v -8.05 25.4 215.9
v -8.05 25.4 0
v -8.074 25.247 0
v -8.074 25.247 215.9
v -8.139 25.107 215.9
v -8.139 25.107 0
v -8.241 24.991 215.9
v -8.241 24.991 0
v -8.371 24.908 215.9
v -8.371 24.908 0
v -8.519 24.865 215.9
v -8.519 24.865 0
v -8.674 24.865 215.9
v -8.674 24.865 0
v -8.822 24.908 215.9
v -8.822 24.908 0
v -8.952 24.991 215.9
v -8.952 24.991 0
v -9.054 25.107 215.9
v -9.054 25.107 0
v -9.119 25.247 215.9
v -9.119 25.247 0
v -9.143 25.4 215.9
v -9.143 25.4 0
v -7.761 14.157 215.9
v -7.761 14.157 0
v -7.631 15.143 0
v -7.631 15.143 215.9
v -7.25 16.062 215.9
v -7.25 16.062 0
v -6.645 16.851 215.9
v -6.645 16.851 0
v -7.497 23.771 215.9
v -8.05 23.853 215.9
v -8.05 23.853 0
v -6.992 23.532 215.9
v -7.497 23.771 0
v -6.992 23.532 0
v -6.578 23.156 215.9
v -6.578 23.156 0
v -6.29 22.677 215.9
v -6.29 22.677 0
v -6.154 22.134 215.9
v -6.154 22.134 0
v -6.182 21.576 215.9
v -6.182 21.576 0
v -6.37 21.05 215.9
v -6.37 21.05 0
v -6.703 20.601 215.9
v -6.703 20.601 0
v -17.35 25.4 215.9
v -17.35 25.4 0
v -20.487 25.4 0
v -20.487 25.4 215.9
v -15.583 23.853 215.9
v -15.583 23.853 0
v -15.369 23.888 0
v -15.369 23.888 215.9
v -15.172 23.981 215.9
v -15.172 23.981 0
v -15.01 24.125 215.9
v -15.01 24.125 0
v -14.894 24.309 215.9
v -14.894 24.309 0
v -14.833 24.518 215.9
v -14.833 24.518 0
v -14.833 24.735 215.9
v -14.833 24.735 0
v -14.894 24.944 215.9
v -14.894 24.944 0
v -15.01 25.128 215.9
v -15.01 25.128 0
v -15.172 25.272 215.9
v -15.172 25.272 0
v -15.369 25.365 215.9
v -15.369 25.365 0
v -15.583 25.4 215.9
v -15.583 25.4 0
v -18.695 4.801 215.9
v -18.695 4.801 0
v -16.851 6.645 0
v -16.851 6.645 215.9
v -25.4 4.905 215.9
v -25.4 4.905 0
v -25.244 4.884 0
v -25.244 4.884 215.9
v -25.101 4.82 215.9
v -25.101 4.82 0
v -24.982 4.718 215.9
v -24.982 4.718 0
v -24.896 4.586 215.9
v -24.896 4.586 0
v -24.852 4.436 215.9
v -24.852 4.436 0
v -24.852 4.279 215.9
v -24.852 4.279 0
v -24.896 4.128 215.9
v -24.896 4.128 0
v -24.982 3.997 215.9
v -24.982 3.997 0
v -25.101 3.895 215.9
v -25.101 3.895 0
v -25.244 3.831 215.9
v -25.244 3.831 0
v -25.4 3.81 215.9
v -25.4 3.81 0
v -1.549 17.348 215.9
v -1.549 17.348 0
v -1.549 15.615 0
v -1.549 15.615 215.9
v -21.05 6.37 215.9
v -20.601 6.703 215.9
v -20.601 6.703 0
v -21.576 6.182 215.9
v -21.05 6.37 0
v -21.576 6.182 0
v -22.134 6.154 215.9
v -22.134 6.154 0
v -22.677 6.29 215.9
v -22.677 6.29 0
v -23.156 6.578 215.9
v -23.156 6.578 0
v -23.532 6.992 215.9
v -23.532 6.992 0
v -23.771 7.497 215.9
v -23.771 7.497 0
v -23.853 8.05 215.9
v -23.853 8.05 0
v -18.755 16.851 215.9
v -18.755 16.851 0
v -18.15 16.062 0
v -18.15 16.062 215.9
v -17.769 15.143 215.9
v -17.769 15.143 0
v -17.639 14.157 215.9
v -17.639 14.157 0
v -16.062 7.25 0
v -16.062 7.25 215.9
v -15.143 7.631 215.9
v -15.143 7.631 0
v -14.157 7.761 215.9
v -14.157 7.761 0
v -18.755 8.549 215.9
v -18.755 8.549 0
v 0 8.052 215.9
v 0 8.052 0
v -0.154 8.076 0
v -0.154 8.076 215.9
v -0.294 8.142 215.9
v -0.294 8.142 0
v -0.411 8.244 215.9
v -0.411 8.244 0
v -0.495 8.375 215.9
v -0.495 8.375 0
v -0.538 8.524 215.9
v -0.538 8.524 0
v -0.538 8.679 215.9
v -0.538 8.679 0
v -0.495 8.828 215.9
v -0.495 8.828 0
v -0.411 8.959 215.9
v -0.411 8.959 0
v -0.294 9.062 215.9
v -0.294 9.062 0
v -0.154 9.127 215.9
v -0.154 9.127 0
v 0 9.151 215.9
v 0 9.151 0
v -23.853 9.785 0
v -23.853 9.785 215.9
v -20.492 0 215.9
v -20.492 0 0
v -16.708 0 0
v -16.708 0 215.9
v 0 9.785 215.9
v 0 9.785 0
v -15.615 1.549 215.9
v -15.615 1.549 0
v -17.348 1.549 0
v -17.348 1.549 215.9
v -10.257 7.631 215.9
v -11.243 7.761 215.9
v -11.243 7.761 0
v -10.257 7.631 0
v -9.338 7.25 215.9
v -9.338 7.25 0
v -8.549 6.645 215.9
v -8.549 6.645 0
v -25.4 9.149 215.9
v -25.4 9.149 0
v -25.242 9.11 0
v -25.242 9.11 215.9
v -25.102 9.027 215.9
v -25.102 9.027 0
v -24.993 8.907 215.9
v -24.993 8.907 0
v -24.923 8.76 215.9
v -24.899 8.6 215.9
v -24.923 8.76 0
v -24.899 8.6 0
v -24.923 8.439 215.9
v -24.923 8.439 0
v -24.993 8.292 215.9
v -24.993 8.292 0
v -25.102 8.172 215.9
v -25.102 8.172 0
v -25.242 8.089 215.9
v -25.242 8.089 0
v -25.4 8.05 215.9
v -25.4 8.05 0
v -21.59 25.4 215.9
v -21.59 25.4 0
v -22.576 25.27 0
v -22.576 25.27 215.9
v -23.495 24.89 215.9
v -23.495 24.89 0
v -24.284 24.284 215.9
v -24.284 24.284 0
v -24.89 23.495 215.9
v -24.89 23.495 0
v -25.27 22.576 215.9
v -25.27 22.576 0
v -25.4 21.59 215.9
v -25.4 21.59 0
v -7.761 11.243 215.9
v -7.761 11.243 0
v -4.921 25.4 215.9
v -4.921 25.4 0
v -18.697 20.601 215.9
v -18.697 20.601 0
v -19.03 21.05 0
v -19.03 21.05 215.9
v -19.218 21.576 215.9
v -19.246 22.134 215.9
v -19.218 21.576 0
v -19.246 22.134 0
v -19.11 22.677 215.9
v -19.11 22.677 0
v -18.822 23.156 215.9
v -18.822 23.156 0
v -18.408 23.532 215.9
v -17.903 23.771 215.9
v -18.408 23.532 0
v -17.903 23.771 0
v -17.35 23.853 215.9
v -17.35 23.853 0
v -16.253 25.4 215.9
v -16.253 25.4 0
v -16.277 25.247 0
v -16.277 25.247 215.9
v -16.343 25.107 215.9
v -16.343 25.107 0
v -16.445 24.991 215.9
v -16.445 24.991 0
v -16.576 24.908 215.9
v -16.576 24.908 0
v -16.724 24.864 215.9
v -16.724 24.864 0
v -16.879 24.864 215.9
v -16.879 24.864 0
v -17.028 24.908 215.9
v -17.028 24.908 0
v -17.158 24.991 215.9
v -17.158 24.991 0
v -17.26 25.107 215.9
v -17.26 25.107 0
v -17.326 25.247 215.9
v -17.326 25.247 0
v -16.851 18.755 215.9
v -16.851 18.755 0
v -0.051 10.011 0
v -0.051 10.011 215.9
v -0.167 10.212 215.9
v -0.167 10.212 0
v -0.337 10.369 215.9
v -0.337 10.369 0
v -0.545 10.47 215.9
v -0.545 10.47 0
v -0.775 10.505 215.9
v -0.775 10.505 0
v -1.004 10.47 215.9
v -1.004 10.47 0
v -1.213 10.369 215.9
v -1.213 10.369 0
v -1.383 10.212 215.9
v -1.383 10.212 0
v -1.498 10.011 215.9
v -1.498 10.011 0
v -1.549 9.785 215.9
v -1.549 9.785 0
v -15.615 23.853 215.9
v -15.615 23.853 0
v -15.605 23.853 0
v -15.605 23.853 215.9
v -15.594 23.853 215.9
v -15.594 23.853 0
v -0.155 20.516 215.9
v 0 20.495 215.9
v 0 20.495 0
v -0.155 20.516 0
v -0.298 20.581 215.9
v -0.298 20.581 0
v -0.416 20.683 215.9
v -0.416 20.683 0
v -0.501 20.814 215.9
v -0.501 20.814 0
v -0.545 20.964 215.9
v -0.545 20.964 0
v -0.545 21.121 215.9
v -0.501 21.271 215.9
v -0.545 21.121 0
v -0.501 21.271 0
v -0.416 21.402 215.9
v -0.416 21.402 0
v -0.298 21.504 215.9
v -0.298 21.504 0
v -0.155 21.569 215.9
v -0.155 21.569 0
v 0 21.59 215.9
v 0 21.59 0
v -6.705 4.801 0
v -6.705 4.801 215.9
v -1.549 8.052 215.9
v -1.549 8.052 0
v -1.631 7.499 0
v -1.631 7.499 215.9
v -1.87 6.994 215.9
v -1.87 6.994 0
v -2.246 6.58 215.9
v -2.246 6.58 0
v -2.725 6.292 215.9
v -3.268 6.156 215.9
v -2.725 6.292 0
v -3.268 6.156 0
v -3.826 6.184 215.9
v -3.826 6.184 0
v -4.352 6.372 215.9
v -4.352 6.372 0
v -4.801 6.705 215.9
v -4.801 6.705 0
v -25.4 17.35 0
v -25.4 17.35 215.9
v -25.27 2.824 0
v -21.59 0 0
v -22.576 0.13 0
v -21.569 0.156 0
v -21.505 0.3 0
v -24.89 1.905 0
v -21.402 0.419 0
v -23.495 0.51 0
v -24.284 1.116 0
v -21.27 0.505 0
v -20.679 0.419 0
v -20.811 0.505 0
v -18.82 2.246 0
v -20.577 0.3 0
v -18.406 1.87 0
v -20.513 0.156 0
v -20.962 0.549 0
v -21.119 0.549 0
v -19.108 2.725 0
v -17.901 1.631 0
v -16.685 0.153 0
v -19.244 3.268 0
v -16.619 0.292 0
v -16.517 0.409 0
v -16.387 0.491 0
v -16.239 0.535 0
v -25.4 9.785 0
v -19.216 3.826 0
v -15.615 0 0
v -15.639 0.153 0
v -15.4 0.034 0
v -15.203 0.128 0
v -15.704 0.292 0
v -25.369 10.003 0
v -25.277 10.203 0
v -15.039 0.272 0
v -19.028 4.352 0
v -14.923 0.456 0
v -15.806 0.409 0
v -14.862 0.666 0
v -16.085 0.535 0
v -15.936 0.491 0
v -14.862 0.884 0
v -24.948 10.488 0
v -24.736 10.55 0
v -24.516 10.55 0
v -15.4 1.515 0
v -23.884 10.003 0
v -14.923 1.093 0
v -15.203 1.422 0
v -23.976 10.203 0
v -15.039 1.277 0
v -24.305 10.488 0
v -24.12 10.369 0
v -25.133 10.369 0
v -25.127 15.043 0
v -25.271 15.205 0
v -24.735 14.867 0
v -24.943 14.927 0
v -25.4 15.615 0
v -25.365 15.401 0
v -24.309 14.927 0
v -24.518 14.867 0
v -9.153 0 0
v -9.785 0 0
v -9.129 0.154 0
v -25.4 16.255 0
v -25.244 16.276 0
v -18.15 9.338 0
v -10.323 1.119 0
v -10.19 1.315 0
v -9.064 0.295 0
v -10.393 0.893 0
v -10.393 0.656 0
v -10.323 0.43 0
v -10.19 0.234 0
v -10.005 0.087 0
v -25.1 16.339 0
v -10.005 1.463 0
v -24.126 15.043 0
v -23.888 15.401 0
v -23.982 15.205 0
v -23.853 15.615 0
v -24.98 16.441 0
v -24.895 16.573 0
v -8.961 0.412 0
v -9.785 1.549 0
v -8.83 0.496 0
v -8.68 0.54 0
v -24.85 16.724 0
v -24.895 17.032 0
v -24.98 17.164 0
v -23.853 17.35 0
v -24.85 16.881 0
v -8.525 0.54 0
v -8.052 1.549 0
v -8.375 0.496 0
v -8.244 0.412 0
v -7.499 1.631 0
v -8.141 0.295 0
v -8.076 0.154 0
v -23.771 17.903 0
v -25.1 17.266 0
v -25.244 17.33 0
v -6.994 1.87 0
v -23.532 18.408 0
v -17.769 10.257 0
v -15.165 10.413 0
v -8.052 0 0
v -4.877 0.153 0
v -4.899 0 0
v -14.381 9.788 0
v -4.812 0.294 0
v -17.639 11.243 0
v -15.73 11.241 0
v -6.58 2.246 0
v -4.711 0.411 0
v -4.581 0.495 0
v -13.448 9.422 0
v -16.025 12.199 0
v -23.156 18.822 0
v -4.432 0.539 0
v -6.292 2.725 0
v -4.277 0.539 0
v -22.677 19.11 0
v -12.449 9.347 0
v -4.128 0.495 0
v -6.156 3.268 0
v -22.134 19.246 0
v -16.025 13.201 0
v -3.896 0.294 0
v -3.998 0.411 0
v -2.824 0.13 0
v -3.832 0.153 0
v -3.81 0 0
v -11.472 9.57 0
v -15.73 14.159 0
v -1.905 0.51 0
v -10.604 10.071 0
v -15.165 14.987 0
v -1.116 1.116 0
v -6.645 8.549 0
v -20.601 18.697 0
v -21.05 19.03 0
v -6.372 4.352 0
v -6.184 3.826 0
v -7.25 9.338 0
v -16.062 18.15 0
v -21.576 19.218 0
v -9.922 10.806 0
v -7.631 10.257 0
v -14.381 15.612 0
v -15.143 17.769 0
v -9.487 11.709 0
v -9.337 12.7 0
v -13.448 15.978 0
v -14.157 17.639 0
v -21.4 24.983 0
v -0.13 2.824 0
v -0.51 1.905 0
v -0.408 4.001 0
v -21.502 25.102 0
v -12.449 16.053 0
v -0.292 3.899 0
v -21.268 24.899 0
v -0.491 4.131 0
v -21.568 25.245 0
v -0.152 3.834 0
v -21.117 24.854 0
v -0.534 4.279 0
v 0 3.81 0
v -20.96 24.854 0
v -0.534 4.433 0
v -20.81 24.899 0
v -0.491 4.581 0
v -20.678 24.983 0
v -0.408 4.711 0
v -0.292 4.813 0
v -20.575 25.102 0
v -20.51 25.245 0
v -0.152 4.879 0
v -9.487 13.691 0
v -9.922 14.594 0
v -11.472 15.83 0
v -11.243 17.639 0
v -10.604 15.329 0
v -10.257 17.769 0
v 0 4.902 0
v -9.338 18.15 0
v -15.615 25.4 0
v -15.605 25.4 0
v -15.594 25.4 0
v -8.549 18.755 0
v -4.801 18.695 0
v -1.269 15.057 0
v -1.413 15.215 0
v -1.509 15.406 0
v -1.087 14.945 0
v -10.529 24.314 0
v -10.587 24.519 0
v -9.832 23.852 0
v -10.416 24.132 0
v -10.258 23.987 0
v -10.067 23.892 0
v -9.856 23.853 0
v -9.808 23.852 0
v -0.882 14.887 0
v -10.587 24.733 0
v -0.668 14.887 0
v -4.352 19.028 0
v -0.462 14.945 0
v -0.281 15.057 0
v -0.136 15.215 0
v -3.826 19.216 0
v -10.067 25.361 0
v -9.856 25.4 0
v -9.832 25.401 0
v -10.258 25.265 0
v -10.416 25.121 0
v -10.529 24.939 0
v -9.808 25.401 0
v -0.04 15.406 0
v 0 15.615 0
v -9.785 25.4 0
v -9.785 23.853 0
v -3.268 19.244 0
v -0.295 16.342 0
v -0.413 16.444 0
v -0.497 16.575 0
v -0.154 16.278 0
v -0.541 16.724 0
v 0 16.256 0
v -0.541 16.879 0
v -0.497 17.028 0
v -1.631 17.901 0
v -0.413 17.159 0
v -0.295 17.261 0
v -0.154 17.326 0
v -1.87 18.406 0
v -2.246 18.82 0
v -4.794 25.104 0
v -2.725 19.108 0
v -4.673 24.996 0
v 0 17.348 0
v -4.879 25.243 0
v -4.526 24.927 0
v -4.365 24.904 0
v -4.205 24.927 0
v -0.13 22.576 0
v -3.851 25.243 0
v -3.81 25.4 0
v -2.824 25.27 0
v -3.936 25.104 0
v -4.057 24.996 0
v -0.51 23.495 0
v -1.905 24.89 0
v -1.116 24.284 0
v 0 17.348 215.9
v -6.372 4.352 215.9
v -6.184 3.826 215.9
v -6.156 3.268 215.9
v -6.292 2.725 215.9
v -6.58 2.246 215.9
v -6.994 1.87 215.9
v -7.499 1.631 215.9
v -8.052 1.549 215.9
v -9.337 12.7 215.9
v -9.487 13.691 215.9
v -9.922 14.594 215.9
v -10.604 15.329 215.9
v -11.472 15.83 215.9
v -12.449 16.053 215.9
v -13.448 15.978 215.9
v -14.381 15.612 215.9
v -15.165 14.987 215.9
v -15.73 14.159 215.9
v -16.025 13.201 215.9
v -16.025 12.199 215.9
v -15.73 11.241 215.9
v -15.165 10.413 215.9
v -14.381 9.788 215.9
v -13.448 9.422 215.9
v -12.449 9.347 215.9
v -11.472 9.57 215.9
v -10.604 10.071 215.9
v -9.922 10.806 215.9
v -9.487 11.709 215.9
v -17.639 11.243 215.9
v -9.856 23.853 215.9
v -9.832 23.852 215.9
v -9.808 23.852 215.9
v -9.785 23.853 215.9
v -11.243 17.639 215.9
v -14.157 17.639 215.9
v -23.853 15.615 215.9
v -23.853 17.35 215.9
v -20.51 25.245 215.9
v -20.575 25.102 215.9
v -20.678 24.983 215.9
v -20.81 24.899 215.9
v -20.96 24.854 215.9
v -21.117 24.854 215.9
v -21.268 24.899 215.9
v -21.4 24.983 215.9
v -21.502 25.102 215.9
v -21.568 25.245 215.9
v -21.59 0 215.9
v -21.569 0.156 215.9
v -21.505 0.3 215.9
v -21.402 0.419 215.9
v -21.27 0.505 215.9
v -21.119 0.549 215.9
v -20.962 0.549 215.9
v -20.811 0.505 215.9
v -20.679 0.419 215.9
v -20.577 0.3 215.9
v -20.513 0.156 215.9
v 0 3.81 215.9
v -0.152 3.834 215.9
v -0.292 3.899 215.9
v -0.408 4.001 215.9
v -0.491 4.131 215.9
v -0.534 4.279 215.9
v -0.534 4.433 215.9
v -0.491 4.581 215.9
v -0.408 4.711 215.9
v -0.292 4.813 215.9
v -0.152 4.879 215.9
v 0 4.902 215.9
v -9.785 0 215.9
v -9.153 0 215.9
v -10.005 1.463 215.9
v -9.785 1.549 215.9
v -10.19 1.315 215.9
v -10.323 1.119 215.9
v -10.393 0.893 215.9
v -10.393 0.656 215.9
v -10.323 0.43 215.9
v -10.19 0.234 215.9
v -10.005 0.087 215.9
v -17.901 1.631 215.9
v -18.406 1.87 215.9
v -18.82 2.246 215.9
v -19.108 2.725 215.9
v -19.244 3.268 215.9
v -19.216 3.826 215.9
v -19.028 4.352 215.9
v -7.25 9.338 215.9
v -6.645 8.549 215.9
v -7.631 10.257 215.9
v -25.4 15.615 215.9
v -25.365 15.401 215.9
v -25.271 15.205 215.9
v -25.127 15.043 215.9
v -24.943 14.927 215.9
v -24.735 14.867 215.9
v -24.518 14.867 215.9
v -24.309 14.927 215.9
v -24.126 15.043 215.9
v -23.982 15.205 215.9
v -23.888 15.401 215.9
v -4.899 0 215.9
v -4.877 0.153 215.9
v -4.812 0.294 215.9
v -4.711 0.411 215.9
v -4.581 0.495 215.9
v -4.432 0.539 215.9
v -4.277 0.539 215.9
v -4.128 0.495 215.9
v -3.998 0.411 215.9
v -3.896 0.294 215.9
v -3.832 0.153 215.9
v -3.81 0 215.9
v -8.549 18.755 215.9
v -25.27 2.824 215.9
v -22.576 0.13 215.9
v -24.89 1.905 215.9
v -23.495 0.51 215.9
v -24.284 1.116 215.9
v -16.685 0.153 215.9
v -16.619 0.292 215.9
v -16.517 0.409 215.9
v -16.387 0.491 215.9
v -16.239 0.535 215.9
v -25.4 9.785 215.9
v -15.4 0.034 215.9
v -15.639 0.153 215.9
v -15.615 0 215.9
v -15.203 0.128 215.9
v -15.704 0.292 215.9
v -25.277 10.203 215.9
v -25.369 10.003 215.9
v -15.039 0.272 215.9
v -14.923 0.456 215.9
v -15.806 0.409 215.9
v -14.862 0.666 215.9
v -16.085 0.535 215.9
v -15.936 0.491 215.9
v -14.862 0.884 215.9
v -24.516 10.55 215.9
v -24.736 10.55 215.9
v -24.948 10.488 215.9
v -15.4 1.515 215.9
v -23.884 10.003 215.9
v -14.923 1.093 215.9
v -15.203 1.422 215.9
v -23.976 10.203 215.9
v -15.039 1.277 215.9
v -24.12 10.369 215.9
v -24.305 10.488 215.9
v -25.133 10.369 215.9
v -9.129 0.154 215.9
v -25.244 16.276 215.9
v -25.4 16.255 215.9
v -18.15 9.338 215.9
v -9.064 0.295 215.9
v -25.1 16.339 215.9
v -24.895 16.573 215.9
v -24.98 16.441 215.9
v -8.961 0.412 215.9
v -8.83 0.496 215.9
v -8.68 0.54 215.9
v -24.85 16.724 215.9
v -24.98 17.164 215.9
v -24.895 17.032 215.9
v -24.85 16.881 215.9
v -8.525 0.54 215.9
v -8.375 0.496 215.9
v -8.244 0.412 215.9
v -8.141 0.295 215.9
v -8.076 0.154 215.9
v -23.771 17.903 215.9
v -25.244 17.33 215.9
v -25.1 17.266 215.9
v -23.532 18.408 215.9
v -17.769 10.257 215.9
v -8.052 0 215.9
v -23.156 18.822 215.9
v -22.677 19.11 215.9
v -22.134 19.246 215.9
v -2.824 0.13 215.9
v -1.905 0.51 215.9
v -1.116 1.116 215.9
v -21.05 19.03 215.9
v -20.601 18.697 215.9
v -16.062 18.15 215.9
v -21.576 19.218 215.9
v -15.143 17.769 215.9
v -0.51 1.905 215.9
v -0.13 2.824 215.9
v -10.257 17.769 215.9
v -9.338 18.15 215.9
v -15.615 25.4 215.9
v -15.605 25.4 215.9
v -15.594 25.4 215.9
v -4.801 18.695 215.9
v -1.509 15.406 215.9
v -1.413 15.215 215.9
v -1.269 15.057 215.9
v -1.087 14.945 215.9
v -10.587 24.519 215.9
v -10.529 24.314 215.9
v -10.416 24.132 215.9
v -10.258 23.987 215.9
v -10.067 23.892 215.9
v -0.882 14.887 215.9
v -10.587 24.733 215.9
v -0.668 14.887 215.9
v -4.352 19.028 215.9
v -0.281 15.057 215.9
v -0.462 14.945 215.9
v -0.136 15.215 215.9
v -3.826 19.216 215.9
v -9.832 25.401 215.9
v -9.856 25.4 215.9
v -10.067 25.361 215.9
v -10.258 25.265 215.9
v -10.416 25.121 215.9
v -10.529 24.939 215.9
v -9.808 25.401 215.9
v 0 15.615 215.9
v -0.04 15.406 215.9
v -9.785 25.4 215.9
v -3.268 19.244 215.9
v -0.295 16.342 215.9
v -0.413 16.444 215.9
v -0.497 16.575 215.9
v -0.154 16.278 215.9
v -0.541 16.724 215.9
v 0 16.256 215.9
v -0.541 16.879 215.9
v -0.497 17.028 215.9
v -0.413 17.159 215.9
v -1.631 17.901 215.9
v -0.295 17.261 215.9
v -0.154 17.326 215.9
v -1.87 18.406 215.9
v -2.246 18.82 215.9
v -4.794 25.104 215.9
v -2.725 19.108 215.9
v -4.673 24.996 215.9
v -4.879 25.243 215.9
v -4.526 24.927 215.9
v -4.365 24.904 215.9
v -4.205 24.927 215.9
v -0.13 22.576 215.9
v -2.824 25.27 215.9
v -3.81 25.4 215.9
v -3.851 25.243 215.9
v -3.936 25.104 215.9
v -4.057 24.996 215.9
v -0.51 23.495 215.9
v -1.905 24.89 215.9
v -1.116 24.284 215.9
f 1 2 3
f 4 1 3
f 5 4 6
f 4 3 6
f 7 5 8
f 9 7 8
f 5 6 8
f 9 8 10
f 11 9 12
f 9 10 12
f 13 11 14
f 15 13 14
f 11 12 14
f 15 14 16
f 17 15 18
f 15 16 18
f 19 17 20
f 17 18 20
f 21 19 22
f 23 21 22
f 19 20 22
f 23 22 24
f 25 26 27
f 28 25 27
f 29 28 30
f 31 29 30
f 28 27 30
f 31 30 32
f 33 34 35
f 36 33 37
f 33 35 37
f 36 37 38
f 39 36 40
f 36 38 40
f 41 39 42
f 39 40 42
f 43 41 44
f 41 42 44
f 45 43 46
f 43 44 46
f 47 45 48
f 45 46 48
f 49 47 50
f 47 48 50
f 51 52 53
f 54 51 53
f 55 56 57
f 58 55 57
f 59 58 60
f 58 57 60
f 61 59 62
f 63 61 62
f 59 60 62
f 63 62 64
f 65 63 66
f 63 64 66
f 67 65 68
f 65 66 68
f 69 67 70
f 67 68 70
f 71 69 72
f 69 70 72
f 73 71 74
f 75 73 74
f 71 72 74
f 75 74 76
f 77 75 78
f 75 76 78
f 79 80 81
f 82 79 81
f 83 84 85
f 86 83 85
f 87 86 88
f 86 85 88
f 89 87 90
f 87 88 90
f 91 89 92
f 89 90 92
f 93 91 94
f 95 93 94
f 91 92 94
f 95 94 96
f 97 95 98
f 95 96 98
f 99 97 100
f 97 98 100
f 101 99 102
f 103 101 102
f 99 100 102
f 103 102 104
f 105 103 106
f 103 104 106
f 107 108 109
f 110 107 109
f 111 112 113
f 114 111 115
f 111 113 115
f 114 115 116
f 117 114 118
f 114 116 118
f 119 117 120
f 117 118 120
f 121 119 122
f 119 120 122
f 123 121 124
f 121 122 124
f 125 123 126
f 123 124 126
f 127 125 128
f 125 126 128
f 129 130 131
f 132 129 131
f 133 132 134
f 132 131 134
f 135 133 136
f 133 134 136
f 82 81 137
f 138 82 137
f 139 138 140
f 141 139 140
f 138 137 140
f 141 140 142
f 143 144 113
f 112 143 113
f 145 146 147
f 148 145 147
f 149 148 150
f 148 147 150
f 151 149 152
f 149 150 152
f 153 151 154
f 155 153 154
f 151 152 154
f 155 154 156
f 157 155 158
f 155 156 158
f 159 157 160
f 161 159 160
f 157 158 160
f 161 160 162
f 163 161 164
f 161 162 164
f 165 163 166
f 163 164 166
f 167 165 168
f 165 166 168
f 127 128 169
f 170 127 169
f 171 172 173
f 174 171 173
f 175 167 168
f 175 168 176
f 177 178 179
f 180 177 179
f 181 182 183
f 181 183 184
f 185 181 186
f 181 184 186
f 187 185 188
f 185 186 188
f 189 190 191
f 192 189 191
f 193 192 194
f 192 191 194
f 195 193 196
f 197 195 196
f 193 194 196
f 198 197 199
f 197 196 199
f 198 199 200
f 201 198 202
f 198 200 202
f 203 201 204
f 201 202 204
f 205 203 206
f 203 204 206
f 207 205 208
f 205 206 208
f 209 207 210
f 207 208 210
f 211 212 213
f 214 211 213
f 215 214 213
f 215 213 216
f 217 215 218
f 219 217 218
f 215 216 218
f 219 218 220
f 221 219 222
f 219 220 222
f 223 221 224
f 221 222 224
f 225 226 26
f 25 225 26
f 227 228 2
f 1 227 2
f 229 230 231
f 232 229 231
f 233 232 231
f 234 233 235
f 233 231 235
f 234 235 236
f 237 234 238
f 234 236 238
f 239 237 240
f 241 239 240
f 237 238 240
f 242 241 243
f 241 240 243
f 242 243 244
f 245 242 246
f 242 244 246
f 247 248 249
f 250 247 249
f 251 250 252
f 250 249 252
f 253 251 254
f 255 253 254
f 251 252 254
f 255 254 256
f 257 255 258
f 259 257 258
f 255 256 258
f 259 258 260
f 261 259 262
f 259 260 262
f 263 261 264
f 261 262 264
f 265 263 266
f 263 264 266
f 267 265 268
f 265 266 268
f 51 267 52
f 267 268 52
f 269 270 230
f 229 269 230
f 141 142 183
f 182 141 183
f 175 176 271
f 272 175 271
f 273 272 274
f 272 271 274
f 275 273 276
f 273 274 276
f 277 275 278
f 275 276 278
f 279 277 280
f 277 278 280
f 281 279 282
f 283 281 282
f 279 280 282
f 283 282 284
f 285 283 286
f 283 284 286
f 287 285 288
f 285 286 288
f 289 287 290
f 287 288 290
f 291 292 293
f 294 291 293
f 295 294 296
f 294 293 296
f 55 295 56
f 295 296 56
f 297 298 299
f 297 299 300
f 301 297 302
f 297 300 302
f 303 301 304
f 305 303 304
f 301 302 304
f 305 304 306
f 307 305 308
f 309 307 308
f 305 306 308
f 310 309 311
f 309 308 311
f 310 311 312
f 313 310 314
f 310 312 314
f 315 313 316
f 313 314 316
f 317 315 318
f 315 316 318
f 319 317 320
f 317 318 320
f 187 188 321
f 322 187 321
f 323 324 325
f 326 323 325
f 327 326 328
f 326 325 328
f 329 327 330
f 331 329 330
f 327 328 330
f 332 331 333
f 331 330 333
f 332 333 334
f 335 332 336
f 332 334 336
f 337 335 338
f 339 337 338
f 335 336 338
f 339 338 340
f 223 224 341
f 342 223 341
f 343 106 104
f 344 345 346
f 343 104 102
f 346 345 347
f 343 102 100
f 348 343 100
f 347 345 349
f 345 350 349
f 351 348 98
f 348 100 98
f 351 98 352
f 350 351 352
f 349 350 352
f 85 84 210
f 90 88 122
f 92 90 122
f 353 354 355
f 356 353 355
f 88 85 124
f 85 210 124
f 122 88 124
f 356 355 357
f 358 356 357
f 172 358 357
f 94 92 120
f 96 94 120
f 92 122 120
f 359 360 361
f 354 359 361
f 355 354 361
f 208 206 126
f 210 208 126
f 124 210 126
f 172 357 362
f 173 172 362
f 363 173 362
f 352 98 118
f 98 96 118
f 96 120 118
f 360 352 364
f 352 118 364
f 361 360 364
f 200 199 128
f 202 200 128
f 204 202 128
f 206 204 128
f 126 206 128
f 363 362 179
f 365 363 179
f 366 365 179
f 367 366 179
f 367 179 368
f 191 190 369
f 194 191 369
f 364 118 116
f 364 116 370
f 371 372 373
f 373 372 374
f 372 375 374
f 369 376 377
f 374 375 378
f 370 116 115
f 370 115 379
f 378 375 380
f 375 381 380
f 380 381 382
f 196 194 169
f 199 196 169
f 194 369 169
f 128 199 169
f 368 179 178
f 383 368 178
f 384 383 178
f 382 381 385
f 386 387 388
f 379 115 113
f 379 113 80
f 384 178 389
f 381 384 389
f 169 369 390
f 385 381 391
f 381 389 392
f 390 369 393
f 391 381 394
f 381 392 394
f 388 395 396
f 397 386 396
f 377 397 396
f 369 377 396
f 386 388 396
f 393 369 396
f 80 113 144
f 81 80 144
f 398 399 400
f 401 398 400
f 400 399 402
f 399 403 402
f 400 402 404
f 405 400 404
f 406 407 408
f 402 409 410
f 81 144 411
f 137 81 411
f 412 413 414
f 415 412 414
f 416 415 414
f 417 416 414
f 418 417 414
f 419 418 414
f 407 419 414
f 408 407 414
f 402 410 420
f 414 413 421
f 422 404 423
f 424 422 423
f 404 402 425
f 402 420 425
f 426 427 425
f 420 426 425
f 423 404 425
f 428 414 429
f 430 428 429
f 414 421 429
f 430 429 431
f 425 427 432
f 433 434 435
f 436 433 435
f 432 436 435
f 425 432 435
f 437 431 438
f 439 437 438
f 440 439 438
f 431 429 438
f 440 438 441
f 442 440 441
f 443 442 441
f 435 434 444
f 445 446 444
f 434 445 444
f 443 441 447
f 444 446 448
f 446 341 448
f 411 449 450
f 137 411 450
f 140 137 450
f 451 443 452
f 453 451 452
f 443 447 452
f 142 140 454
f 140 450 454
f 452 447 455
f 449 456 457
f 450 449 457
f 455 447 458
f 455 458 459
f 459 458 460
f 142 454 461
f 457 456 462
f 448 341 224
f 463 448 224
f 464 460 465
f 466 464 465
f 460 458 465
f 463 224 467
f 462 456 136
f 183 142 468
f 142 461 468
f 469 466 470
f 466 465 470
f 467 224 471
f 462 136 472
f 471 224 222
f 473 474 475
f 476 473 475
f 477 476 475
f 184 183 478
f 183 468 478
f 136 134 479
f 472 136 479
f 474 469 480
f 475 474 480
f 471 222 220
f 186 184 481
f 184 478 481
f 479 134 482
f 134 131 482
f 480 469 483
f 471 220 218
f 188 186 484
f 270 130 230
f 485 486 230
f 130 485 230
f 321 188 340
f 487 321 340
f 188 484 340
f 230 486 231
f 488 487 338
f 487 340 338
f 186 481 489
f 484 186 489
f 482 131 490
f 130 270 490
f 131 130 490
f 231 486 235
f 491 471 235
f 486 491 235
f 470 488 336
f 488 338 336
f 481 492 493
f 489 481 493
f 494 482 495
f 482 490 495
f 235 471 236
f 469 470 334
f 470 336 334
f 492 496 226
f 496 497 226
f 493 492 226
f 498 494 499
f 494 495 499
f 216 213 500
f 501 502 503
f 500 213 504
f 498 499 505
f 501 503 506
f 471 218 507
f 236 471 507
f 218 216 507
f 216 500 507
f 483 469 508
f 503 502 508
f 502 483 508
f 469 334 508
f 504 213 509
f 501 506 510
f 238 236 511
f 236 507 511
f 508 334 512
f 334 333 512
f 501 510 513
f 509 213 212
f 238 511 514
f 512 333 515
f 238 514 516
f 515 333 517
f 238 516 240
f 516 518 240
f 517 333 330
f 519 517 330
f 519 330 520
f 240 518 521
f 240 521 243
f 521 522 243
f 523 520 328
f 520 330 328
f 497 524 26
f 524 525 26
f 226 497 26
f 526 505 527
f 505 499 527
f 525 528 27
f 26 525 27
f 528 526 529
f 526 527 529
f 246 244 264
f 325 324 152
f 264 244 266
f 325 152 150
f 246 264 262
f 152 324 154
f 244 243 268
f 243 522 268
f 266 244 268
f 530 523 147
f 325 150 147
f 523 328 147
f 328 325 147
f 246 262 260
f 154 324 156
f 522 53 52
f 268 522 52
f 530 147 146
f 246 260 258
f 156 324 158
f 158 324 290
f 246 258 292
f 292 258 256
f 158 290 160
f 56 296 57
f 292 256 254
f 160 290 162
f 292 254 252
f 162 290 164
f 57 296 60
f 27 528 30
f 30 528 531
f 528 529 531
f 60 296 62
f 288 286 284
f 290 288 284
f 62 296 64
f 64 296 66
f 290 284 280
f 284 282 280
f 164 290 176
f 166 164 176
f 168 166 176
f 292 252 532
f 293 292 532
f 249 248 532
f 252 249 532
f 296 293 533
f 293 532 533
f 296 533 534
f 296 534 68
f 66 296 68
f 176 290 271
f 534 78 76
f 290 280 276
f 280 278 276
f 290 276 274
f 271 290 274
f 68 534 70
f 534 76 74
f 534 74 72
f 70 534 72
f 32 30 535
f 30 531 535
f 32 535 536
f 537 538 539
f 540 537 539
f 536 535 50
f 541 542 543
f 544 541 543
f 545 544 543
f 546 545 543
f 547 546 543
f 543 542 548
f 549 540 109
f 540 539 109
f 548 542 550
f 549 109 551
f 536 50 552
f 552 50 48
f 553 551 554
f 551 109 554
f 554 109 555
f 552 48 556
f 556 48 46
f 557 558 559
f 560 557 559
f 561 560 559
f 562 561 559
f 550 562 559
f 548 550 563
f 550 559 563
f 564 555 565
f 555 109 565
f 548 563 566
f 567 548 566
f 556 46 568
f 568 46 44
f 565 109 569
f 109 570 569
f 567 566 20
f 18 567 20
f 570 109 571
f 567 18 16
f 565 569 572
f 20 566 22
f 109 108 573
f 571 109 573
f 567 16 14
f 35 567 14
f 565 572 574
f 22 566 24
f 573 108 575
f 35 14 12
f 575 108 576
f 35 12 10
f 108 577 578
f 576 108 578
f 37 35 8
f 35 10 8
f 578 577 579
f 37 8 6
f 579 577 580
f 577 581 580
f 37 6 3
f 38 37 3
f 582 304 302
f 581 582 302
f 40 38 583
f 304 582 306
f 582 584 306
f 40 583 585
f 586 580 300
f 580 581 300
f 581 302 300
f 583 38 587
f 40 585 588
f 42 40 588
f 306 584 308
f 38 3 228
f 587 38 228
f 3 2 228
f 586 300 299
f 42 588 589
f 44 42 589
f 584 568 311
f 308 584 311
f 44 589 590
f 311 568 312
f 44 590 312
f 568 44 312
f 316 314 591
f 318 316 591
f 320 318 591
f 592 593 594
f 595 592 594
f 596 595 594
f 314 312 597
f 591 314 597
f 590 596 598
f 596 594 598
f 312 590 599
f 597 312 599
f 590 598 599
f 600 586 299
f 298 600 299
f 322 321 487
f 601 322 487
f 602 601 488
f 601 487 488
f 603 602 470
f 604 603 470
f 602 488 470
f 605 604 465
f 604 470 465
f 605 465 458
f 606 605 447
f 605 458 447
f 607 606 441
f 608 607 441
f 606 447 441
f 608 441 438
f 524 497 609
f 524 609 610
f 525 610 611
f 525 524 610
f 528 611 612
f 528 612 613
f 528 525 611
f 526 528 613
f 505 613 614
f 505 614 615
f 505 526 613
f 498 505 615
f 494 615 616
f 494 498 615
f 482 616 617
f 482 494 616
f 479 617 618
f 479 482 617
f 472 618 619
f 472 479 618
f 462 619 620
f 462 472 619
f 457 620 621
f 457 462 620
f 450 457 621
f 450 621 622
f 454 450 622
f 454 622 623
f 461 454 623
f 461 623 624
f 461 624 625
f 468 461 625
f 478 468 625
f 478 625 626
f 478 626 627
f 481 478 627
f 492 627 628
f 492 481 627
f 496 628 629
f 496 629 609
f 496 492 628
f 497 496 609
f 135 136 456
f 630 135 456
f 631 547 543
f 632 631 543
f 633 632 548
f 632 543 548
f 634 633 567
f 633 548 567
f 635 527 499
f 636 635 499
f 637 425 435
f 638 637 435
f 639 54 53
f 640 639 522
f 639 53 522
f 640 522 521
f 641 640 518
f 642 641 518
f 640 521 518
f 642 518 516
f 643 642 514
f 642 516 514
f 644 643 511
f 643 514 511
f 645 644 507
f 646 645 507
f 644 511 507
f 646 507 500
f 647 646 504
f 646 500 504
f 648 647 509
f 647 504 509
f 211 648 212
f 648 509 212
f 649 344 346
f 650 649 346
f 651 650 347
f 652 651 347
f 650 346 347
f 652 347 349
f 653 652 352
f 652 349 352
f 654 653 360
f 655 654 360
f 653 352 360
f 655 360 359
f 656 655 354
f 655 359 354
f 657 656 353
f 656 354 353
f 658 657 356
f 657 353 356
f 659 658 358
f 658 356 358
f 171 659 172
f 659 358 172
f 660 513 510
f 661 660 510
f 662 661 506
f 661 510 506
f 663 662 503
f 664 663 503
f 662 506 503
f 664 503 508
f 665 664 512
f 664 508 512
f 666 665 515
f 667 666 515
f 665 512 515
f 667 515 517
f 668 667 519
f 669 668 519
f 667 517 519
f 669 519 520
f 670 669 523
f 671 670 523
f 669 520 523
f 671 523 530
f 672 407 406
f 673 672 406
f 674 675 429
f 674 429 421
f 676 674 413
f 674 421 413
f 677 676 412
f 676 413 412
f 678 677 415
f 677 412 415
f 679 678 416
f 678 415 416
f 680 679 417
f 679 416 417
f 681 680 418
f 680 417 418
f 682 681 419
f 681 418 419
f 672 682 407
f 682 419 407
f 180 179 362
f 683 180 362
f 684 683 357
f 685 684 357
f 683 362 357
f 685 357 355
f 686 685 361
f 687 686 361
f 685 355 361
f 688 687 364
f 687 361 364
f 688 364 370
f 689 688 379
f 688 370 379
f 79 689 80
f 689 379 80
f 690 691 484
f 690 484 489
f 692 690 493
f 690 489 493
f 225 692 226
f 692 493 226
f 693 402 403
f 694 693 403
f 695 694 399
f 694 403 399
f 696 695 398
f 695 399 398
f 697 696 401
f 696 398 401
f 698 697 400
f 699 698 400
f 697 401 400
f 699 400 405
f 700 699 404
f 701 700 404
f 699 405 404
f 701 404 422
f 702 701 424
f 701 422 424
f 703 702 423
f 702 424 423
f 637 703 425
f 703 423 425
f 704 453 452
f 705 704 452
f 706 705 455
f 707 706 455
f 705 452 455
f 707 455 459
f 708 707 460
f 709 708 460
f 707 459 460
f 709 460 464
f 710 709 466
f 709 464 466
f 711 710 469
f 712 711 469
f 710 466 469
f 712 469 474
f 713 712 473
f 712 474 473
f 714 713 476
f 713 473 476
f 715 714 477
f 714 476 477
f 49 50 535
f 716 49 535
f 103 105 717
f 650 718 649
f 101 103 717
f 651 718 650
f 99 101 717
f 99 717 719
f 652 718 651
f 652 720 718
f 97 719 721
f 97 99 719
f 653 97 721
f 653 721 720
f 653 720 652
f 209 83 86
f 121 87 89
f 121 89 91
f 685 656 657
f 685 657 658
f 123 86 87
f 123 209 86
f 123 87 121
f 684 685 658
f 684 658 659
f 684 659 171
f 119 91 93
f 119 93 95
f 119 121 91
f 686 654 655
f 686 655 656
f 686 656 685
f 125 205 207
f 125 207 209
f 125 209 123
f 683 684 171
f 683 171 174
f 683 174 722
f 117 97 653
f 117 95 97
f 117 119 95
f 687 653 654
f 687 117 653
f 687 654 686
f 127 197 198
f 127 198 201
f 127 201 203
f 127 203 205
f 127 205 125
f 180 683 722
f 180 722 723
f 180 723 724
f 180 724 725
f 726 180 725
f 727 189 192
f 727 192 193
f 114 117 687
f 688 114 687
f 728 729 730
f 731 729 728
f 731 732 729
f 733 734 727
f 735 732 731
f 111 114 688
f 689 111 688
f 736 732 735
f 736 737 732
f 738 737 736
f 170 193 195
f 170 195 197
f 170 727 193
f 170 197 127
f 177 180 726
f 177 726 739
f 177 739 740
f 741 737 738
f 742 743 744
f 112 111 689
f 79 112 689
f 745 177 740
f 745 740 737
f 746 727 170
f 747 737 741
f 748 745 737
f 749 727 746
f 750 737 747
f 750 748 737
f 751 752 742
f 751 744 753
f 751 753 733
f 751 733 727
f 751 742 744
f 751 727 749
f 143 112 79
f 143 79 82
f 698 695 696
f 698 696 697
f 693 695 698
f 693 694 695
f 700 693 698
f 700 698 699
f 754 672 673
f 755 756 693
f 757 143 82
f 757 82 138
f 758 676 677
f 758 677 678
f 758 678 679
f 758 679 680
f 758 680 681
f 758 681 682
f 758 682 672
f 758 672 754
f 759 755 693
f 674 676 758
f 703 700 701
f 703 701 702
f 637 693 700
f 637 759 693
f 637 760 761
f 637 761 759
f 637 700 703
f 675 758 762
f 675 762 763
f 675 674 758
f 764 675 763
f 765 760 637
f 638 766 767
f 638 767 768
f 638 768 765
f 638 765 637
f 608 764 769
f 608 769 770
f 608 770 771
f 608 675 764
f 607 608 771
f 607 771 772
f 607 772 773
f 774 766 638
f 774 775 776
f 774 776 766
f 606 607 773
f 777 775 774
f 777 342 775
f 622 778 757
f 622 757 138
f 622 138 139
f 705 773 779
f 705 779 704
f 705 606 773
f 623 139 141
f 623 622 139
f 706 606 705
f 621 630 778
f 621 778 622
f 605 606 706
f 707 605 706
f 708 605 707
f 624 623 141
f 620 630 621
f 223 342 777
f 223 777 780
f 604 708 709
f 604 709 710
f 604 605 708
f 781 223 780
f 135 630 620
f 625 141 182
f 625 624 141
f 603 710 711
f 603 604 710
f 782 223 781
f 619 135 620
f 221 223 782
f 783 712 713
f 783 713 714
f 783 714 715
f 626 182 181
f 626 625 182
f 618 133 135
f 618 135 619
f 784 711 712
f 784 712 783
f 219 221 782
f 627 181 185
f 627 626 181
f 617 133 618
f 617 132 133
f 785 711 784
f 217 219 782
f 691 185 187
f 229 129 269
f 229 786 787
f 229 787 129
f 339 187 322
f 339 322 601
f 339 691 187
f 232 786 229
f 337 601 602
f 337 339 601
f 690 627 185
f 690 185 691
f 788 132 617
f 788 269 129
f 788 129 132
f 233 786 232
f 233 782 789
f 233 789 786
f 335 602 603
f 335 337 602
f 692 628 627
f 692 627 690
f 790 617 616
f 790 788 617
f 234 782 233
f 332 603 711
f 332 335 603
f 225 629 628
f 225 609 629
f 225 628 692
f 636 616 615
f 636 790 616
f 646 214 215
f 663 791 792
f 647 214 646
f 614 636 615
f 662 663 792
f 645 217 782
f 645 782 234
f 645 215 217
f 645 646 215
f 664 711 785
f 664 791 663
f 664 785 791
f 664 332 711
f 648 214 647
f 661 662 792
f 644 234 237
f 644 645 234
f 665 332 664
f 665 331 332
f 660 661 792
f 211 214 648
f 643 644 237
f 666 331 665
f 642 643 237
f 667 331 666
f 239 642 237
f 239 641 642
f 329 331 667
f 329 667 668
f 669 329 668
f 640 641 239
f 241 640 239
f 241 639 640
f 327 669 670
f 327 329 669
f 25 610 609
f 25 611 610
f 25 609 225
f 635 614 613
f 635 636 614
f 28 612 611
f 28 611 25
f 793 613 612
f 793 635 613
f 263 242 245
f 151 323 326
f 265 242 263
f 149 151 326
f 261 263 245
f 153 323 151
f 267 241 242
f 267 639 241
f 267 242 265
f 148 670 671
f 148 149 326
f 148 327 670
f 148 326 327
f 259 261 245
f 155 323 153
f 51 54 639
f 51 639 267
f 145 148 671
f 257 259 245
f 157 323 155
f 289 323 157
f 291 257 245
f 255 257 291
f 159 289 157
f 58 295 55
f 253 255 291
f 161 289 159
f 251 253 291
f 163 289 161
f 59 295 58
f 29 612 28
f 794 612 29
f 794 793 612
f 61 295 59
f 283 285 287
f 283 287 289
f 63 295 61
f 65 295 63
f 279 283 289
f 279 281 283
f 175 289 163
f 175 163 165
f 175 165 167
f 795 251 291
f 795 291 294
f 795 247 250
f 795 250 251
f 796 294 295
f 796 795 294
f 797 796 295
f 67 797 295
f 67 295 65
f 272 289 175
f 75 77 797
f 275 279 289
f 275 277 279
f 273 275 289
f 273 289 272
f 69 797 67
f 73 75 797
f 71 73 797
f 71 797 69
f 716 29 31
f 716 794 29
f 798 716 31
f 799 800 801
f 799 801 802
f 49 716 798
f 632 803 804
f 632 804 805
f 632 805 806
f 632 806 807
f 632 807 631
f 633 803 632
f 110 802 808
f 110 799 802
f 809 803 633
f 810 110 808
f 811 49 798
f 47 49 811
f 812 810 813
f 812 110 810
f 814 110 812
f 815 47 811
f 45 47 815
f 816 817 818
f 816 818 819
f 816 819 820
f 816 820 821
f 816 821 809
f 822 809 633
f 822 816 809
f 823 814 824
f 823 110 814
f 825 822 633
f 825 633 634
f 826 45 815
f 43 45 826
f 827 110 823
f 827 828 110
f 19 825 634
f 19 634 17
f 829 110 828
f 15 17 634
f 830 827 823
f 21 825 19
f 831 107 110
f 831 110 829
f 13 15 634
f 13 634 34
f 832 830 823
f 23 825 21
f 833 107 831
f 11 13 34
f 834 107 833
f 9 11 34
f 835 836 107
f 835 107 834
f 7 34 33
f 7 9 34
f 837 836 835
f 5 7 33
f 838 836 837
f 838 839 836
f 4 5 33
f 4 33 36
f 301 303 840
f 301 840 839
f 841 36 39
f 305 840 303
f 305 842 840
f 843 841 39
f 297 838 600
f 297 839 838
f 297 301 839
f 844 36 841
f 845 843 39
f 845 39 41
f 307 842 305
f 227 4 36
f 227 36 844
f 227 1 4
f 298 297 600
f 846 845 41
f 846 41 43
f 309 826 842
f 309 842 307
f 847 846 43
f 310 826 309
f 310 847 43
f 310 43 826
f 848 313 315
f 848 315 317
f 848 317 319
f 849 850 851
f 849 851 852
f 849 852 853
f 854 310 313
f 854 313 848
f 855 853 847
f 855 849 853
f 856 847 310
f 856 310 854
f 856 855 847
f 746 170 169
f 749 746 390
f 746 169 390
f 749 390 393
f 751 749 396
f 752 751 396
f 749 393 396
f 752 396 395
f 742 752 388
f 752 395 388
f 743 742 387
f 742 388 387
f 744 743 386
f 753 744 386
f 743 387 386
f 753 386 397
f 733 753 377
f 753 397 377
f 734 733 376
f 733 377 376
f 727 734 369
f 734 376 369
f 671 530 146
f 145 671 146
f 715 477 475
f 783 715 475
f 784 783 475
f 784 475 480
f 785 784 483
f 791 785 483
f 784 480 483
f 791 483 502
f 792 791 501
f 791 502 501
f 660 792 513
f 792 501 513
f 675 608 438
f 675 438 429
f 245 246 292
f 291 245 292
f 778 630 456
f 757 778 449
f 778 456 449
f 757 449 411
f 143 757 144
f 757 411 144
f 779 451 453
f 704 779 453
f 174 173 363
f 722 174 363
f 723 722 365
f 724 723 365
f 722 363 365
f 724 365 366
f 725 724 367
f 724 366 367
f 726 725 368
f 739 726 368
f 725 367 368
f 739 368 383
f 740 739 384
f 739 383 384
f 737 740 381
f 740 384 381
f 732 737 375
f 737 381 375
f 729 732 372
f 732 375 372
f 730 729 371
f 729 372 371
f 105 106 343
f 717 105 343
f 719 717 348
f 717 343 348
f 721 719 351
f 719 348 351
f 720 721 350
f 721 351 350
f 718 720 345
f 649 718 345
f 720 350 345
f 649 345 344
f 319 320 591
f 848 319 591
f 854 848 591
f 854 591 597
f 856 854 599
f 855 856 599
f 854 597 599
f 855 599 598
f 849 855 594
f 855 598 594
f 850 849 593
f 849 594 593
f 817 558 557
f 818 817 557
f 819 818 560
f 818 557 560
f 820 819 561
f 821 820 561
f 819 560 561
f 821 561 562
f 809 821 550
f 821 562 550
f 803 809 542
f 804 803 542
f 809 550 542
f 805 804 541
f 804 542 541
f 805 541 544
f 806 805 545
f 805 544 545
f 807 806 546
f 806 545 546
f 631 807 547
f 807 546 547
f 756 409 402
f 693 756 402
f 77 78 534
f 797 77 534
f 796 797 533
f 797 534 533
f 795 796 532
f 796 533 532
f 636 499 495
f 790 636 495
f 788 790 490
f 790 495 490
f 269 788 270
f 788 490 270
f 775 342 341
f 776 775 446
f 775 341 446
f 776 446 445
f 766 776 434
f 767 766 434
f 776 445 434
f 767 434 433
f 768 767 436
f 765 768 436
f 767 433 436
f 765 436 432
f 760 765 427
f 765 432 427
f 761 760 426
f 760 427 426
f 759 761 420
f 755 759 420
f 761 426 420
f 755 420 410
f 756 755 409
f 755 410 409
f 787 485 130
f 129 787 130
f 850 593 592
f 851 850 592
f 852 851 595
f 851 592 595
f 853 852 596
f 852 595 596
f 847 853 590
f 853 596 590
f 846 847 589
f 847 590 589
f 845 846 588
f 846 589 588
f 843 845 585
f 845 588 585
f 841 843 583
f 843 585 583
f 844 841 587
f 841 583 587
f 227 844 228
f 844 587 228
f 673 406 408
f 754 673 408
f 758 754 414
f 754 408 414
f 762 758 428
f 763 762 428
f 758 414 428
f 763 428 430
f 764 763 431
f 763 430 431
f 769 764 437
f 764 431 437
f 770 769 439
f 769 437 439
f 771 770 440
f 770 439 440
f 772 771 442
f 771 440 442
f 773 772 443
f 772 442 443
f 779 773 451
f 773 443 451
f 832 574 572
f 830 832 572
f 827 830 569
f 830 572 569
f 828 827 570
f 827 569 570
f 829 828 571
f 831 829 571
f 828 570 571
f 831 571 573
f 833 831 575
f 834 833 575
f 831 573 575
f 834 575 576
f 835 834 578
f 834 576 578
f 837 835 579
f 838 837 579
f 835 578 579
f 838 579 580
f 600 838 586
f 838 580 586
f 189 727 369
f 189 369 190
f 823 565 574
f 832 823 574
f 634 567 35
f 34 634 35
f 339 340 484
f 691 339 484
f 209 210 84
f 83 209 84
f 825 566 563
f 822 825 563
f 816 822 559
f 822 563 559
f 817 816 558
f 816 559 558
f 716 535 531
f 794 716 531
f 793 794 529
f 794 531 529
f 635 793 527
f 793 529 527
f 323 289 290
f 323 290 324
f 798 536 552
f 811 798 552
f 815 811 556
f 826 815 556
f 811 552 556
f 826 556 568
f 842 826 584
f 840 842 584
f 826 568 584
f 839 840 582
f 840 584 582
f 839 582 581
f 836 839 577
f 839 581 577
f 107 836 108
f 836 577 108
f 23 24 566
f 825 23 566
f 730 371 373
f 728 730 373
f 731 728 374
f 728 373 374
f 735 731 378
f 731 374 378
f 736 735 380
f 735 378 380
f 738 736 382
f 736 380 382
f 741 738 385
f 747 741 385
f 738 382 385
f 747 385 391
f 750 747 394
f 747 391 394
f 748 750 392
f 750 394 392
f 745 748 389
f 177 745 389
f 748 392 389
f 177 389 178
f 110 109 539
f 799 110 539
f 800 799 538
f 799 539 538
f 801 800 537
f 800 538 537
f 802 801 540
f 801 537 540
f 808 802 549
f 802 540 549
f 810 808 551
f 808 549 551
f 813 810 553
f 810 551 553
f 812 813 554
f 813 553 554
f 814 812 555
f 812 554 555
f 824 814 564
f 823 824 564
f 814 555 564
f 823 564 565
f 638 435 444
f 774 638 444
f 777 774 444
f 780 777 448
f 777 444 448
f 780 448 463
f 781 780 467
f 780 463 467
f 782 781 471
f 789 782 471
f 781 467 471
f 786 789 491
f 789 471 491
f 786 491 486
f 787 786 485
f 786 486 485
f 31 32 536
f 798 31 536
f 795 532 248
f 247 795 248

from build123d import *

# Parameters (mm, degrees)
F0_R     = 3.362501
F1_DEPTH = 215.9


with BuildPart() as f1:
    # F0 (on Top) → F1 (new body)
    with BuildSketch(Plane.XY):
        with BuildLine():
            ThreePointArc((-8.548576, 18.755238), (-9.784629, 17.929334), (-11.242653, 17.639315))
            Line((-11.242653, 17.639315), (-14.157347, 17.639315))
            ThreePointArc((-14.157347, 17.639315), (-15.615371, 17.929334), (-16.851424, 18.755238))
            Line((-16.851424, 18.755238), (-18.696905, 20.600719))
            ThreePointArc((-18.696905, 20.600719), (-19.109857, 22.67677), (-17.349867, 23.852758))
            Line((-17.349867, 23.852758), (-15.615371, 23.852758))
            Line((-15.615371, 23.852758), (-15.58302, 23.852758))
            ThreePointArc((-15.58302, 23.852758), (-14.825405, 24.626379), (-15.58302, 25.4))
            Line((-15.58302, 25.4), (-15.615371, 25.4))
            Line((-15.615371, 25.4), (-16.253341, 25.4))
            ThreePointArc((-16.253341, 25.4), (-16.801604, 24.858772), (-17.349867, 25.4))
            Line((-17.349867, 25.4), (-20.487482, 25.4))
            ThreePointArc((-20.487482, 25.4), (-21.038741, 24.848741), (-21.59, 25.4))
            ThreePointArc((-21.59, 25.4), (-24.284077, 24.284077), (-25.4, 21.59))
            Line((-25.4, 21.59), (-25.4, 20.504724))
            Line((-25.4, 20.504724), (-25.4, 17.349867))
            ThreePointArc((-25.4, 17.349867), (-24.844161, 16.802675), (-25.4, 16.255483))
            Line((-25.4, 16.255483), (-25.4, 15.615371))
            ThreePointArc((-25.4, 15.615371), (-24.626379, 14.859554), (-23.852758, 15.615371))
            Line((-23.852758, 15.615371), (-23.852758, 17.349867))
            ThreePointArc((-23.852758, 17.349867), (-22.67677, 19.109857), (-20.600719, 18.696905))
            Line((-20.600719, 18.696905), (-18.755238, 16.851424))
            ThreePointArc((-18.755238, 16.851424), (-17.929334, 15.615371), (-17.639315, 14.157347))
            Line((-17.639315, 14.157347), (-17.639315, 11.242653))
            ThreePointArc((-17.639315, 11.242653), (-17.929334, 9.784629), (-18.755238, 8.548576))
            Line((-18.755238, 8.548576), (-20.600719, 6.703095))
            ThreePointArc((-20.600719, 6.703095), (-22.67677, 6.290143), (-23.852758, 8.050133))
            Line((-23.852758, 8.050133), (-23.852758, 9.784629))
            ThreePointArc((-23.852758, 9.784629), (-24.626379, 10.55825), (-25.4, 9.784629))
            Line((-25.4, 9.784629), (-25.4, 9.149239))
            ThreePointArc((-25.4, 9.149239), (-24.899374, 8.599686), (-25.4, 8.050133))
            Line((-25.4, 8.050133), (-25.4, 4.904538))
            ThreePointArc((-25.4, 4.904538), (-24.846216, 4.357269), (-25.4, 3.81))
            ThreePointArc((-25.4, 3.81), (-24.284077, 1.115923), (-21.59, 0))
            ThreePointArc((-21.59, 0), (-21.040817, 0.554885), (-20.491634, 0))
            Line((-20.491634, 0), (-16.708169, 0))
            ThreePointArc((-16.708169, 0), (-16.16177, 0.540135), (-15.615371, 0))
            ThreePointArc((-15.615371, 0), (-14.854184, 0.7747), (-15.615371, 1.5494))
            Line((-15.615371, 1.5494), (-17.347709, 1.5494))
            ThreePointArc((-17.347709, 1.5494), (-19.107699, 2.725388), (-18.694747, 4.801438))
            Line((-18.694747, 4.801438), (-16.851424, 6.644762))
            ThreePointArc((-16.851424, 6.644762), (-15.615371, 7.470666), (-14.157347, 7.760685))
            Line((-14.157347, 7.760685), (-11.242653, 7.760685))
            ThreePointArc((-11.242653, 7.760685), (-9.784629, 7.470666), (-8.548576, 6.644762))
            Line((-8.548576, 6.644762), (-6.705253, 4.801438))
            ThreePointArc((-6.705253, 4.801438), (-6.292301, 2.725388), (-8.052291, 1.5494))
            Line((-8.052291, 1.5494), (-9.784629, 1.5494))
            ThreePointArc((-9.784629, 1.5494), (-10.401836, 0.7747), (-9.784629, 0))
            Line((-9.784629, 0), (-9.152868, 0))
            ThreePointArc((-9.152868, 0), (-8.602579, 0.545262), (-8.052291, 0))
            Line((-8.052291, 0), (-4.898866, 0))
            ThreePointArc((-4.898866, 0), (-4.354433, 0.544433), (-3.81, 0))
            ThreePointArc((-3.81, 0), (-1.115923, 1.115923), (0, 3.81))
            ThreePointArc((0, 3.81), (-0.53938, 4.3561), (0, 4.9022))
            Line((0, 4.9022), (0, 8.052291))
            ThreePointArc((0, 8.052291), (-0.543517, 8.60166), (0, 9.151029))
            Line((0, 9.151029), (0, 9.784629))
            ThreePointArc((0, 9.784629), (-0.7747, 10.504691), (-1.5494, 9.784629))
            Line((-1.5494, 9.784629), (-1.5494, 8.052291))
            ThreePointArc((-1.5494, 8.052291), (-2.725388, 6.292301), (-4.801438, 6.705253))
            Line((-4.801438, 6.705253), (-6.644762, 8.548576))
            ThreePointArc((-6.644762, 8.548576), (-7.470666, 9.784629), (-7.760685, 11.242653))
            Line((-7.760685, 11.242653), (-7.760685, 14.157347))
            ThreePointArc((-7.760685, 14.157347), (-7.470666, 15.615371), (-6.644762, 16.851424))
            Line((-6.644762, 16.851424), (-4.801438, 18.694747))
            ThreePointArc((-4.801438, 18.694747), (-2.725388, 19.107699), (-1.5494, 17.347709))
            Line((-1.5494, 17.347709), (-1.5494, 15.615371))
            ThreePointArc((-1.5494, 15.615371), (-0.7747, 14.879405), (0, 15.615371))
            Line((0, 15.615371), (0, 16.255509))
            ThreePointArc((0, 16.255509), (-0.5461, 16.801609), (0, 17.347709))
            Line((0, 17.347709), (0, 20.495165))
            ThreePointArc((0, 20.495165), (-0.551056, 21.042583), (0, 21.59))
            ThreePointArc((0, 21.59), (-1.115923, 24.284077), (-3.81, 25.4))
            ThreePointArc((-3.81, 25.4), (-4.365303, 24.903619), (-4.920606, 25.4))
            Line((-4.920606, 25.4), (-8.050133, 25.4))
            ThreePointArc((-8.050133, 25.4), (-8.596365, 24.859433), (-9.142596, 25.4))
            Line((-9.142596, 25.4), (-9.784629, 25.4))
            Line((-9.784629, 25.4), (-9.856203, 25.4))
            ThreePointArc((-9.856203, 25.4), (-10.594864, 24.626379), (-9.856203, 23.852758))
            Line((-9.856203, 23.852758), (-9.784629, 23.852758))
            Line((-9.784629, 23.852758), (-8.050133, 23.852758))
            ThreePointArc((-8.050133, 23.852758), (-6.290143, 22.67677), (-6.703095, 20.600719))
            Line((-6.703095, 20.600719), (-8.548576, 18.755238))
        make_face()
        with Locations((-12.7, 12.7)):
            Circle(F0_R, mode=Mode.SUBTRACT)
        with BuildLine():
            ThreePointArc((-9.856203, 23.852758), (-9.820416, 23.851931), (-9.784629, 23.852758))
            Line((-9.784629, 23.852758), (-9.856203, 23.852758))
        make_face()
        with BuildLine():
            Line((-15.58302, 23.852758), (-15.615371, 23.852758))
            ThreePointArc((-15.615371, 23.852758), (-15.599195, 23.852589), (-15.58302, 23.852758))
        make_face()
        with BuildLine():
            ThreePointArc((-9.784629, 25.4), (-9.820416, 25.400827), (-9.856203, 25.4))
            Line((-9.856203, 25.4), (-9.784629, 25.4))
        make_face()
        with BuildLine():
            Line((-15.615371, 25.4), (-15.58302, 25.4))
            ThreePointArc((-15.58302, 25.4), (-15.599195, 25.400169), (-15.615371, 25.4))
        make_face()
    extrude(amount=F1_DEPTH)


solid = f1.part
